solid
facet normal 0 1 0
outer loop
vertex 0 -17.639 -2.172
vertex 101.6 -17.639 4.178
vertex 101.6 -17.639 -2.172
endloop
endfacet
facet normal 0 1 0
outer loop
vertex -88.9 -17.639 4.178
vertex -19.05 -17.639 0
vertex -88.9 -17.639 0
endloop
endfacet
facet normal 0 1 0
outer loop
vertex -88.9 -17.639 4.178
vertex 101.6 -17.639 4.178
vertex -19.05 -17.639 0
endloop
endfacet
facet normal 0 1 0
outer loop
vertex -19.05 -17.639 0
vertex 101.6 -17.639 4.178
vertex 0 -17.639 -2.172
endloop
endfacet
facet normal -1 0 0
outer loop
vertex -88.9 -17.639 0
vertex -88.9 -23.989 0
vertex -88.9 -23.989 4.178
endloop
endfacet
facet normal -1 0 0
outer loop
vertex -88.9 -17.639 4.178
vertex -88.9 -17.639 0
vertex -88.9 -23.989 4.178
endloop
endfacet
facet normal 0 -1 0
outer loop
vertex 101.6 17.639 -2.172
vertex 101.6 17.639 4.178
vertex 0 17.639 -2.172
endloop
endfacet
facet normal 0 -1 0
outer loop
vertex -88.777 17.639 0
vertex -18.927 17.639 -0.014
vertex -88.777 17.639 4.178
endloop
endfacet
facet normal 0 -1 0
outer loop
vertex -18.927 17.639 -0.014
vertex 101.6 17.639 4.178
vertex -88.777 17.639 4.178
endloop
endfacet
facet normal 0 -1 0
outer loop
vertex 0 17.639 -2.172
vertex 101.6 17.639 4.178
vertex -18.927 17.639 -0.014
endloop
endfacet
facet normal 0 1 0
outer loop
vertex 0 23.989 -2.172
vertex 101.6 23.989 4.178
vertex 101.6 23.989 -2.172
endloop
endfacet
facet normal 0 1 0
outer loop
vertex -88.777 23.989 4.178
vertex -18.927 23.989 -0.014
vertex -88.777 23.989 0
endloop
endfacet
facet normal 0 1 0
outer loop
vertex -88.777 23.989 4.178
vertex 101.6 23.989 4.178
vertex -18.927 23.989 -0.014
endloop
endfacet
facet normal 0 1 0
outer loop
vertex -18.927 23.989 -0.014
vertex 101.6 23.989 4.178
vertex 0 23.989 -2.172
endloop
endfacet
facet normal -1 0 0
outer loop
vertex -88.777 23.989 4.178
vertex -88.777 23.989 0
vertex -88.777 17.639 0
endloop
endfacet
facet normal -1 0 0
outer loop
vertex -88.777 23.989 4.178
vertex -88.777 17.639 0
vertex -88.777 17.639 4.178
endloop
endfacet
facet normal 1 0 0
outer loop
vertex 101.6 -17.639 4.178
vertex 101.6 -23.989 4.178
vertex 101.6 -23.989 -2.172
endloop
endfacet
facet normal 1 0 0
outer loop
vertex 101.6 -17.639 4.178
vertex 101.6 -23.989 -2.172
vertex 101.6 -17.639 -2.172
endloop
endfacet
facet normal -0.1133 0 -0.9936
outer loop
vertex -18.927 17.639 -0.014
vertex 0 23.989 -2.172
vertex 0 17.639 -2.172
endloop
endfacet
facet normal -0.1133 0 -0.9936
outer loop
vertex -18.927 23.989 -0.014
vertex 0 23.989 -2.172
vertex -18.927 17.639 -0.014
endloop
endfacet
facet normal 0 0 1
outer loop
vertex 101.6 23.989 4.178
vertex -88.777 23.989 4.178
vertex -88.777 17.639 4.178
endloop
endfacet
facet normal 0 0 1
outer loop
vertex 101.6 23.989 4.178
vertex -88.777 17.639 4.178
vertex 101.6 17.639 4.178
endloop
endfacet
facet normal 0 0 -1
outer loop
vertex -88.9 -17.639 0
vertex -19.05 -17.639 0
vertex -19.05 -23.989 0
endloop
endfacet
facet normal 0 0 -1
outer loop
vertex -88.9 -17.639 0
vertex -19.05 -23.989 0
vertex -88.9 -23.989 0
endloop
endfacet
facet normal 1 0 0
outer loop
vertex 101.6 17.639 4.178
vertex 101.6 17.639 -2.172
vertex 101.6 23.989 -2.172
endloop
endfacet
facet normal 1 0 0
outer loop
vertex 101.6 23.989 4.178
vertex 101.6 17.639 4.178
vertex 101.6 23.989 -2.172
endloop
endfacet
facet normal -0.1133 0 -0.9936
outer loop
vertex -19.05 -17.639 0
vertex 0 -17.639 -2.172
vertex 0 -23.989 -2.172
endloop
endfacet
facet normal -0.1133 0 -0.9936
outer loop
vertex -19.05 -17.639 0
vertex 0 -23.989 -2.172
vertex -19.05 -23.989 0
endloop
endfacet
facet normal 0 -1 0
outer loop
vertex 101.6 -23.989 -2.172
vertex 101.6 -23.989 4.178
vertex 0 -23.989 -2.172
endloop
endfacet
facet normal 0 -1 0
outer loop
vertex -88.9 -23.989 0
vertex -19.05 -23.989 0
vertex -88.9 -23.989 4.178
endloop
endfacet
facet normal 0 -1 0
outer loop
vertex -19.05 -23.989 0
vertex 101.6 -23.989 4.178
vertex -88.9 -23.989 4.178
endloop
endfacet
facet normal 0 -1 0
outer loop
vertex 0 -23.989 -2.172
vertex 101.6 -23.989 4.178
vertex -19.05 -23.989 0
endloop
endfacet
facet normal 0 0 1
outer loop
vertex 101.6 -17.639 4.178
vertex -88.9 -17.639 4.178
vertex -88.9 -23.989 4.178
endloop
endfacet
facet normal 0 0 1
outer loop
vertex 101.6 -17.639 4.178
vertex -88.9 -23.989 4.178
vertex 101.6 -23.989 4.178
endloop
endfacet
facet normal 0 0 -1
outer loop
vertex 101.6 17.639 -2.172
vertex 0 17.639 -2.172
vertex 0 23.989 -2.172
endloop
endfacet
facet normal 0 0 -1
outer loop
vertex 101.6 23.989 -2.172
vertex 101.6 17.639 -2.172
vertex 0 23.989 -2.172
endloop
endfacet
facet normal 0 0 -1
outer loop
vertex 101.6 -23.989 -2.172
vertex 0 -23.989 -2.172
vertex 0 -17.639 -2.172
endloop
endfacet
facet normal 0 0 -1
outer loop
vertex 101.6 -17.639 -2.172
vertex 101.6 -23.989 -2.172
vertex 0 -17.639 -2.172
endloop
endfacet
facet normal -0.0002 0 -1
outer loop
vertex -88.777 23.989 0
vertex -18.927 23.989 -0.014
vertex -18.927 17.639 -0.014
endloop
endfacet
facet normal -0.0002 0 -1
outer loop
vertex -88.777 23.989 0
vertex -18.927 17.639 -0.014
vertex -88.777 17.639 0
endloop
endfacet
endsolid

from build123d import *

# Parameters (mm, degrees)
F0_W     = 6.35
F0_H     = 6.35
F1_DEPTH = 101.6
F3_DEPTH = 6.35
F5_DEPTH = 6.35


with BuildPart() as f1:
    # F0 (on Right) → F1 (new body)
    with BuildSketch(Plane.YZ):
        with Locations((-20.8139, 1.003265)):
            Rectangle(F0_W, F0_H)
        with Locations((20.813896, 1.003265)):
            Rectangle(F0_W, F0_H)
    extrude(amount=F1_DEPTH)

    # F2 (on face) → F3 (join)
    with BuildSketch(Plane(origin=(0, -17.6389, 0), x_dir=(-1, 0, 0), z_dir=(0, 1, 0))):
        Polygon((88.9, 4.178265), (0, 4.178265), (0, -2.171735), (19.05, 0), (88.9, 0), align=None)
    extrude(amount=-F3_DEPTH)

    # F4 (on face) → F5 (join)
    with BuildSketch(Plane(origin=(0, 23.988896, 0), x_dir=(-1, 0, 0), z_dir=(0, 1, 0))):
        Polygon((88.777403, 4.178265), (0, 4.178265), (0, -2.171735), (18.927403, -0.013976), (88.777403, 0), align=None)
    extrude(amount=-F5_DEPTH)


solid = f1.part
